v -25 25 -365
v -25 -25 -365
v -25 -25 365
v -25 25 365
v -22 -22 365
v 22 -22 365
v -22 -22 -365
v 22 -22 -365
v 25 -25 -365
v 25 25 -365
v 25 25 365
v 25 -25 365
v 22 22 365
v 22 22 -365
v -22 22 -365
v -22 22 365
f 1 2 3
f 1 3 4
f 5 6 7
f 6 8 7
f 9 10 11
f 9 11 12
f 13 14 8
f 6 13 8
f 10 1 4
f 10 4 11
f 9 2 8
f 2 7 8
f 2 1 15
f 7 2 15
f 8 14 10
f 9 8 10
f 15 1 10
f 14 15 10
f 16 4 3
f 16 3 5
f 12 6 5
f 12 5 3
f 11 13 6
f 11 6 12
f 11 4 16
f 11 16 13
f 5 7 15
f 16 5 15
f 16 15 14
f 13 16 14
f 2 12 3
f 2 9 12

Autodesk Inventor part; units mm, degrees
sketch "Sketch1" plane through (0, 0, 0) normal (0, 0, 1) x (1, 0, 0)
  line L0 (-25, 25) -> (25, 25)
  line L1 (25, 25) -> (25, -25)
  line L2 (25, -25) -> (-25, -25)
  line L3 (-25, -25) -> (-25, 25)
  line L4 (-25, 25) -> (25, -25) construction
  line L5 (25, 25) -> (-25, -25) construction
  line L6 (-22, 22) -> (22, 22)
  line L7 (22, 22) -> (22, -22)
  line L8 (22, -22) -> (-22, -22)
  line L9 (-22, -22) -> (-22, 22)
  line L10 (-22, 22) -> (22, -22) construction
  line L11 (22, 22) -> (-22, -22) construction
  point P0 (0, 0)
  point P1 (0, 0)
  dimension "d0" = 50
  dimension "d1" = 3
extrude "Extrusion1" add sketch "Sketch1" along normal mid plane 730
properties part number "perna" material "Wood (Walnut)"
